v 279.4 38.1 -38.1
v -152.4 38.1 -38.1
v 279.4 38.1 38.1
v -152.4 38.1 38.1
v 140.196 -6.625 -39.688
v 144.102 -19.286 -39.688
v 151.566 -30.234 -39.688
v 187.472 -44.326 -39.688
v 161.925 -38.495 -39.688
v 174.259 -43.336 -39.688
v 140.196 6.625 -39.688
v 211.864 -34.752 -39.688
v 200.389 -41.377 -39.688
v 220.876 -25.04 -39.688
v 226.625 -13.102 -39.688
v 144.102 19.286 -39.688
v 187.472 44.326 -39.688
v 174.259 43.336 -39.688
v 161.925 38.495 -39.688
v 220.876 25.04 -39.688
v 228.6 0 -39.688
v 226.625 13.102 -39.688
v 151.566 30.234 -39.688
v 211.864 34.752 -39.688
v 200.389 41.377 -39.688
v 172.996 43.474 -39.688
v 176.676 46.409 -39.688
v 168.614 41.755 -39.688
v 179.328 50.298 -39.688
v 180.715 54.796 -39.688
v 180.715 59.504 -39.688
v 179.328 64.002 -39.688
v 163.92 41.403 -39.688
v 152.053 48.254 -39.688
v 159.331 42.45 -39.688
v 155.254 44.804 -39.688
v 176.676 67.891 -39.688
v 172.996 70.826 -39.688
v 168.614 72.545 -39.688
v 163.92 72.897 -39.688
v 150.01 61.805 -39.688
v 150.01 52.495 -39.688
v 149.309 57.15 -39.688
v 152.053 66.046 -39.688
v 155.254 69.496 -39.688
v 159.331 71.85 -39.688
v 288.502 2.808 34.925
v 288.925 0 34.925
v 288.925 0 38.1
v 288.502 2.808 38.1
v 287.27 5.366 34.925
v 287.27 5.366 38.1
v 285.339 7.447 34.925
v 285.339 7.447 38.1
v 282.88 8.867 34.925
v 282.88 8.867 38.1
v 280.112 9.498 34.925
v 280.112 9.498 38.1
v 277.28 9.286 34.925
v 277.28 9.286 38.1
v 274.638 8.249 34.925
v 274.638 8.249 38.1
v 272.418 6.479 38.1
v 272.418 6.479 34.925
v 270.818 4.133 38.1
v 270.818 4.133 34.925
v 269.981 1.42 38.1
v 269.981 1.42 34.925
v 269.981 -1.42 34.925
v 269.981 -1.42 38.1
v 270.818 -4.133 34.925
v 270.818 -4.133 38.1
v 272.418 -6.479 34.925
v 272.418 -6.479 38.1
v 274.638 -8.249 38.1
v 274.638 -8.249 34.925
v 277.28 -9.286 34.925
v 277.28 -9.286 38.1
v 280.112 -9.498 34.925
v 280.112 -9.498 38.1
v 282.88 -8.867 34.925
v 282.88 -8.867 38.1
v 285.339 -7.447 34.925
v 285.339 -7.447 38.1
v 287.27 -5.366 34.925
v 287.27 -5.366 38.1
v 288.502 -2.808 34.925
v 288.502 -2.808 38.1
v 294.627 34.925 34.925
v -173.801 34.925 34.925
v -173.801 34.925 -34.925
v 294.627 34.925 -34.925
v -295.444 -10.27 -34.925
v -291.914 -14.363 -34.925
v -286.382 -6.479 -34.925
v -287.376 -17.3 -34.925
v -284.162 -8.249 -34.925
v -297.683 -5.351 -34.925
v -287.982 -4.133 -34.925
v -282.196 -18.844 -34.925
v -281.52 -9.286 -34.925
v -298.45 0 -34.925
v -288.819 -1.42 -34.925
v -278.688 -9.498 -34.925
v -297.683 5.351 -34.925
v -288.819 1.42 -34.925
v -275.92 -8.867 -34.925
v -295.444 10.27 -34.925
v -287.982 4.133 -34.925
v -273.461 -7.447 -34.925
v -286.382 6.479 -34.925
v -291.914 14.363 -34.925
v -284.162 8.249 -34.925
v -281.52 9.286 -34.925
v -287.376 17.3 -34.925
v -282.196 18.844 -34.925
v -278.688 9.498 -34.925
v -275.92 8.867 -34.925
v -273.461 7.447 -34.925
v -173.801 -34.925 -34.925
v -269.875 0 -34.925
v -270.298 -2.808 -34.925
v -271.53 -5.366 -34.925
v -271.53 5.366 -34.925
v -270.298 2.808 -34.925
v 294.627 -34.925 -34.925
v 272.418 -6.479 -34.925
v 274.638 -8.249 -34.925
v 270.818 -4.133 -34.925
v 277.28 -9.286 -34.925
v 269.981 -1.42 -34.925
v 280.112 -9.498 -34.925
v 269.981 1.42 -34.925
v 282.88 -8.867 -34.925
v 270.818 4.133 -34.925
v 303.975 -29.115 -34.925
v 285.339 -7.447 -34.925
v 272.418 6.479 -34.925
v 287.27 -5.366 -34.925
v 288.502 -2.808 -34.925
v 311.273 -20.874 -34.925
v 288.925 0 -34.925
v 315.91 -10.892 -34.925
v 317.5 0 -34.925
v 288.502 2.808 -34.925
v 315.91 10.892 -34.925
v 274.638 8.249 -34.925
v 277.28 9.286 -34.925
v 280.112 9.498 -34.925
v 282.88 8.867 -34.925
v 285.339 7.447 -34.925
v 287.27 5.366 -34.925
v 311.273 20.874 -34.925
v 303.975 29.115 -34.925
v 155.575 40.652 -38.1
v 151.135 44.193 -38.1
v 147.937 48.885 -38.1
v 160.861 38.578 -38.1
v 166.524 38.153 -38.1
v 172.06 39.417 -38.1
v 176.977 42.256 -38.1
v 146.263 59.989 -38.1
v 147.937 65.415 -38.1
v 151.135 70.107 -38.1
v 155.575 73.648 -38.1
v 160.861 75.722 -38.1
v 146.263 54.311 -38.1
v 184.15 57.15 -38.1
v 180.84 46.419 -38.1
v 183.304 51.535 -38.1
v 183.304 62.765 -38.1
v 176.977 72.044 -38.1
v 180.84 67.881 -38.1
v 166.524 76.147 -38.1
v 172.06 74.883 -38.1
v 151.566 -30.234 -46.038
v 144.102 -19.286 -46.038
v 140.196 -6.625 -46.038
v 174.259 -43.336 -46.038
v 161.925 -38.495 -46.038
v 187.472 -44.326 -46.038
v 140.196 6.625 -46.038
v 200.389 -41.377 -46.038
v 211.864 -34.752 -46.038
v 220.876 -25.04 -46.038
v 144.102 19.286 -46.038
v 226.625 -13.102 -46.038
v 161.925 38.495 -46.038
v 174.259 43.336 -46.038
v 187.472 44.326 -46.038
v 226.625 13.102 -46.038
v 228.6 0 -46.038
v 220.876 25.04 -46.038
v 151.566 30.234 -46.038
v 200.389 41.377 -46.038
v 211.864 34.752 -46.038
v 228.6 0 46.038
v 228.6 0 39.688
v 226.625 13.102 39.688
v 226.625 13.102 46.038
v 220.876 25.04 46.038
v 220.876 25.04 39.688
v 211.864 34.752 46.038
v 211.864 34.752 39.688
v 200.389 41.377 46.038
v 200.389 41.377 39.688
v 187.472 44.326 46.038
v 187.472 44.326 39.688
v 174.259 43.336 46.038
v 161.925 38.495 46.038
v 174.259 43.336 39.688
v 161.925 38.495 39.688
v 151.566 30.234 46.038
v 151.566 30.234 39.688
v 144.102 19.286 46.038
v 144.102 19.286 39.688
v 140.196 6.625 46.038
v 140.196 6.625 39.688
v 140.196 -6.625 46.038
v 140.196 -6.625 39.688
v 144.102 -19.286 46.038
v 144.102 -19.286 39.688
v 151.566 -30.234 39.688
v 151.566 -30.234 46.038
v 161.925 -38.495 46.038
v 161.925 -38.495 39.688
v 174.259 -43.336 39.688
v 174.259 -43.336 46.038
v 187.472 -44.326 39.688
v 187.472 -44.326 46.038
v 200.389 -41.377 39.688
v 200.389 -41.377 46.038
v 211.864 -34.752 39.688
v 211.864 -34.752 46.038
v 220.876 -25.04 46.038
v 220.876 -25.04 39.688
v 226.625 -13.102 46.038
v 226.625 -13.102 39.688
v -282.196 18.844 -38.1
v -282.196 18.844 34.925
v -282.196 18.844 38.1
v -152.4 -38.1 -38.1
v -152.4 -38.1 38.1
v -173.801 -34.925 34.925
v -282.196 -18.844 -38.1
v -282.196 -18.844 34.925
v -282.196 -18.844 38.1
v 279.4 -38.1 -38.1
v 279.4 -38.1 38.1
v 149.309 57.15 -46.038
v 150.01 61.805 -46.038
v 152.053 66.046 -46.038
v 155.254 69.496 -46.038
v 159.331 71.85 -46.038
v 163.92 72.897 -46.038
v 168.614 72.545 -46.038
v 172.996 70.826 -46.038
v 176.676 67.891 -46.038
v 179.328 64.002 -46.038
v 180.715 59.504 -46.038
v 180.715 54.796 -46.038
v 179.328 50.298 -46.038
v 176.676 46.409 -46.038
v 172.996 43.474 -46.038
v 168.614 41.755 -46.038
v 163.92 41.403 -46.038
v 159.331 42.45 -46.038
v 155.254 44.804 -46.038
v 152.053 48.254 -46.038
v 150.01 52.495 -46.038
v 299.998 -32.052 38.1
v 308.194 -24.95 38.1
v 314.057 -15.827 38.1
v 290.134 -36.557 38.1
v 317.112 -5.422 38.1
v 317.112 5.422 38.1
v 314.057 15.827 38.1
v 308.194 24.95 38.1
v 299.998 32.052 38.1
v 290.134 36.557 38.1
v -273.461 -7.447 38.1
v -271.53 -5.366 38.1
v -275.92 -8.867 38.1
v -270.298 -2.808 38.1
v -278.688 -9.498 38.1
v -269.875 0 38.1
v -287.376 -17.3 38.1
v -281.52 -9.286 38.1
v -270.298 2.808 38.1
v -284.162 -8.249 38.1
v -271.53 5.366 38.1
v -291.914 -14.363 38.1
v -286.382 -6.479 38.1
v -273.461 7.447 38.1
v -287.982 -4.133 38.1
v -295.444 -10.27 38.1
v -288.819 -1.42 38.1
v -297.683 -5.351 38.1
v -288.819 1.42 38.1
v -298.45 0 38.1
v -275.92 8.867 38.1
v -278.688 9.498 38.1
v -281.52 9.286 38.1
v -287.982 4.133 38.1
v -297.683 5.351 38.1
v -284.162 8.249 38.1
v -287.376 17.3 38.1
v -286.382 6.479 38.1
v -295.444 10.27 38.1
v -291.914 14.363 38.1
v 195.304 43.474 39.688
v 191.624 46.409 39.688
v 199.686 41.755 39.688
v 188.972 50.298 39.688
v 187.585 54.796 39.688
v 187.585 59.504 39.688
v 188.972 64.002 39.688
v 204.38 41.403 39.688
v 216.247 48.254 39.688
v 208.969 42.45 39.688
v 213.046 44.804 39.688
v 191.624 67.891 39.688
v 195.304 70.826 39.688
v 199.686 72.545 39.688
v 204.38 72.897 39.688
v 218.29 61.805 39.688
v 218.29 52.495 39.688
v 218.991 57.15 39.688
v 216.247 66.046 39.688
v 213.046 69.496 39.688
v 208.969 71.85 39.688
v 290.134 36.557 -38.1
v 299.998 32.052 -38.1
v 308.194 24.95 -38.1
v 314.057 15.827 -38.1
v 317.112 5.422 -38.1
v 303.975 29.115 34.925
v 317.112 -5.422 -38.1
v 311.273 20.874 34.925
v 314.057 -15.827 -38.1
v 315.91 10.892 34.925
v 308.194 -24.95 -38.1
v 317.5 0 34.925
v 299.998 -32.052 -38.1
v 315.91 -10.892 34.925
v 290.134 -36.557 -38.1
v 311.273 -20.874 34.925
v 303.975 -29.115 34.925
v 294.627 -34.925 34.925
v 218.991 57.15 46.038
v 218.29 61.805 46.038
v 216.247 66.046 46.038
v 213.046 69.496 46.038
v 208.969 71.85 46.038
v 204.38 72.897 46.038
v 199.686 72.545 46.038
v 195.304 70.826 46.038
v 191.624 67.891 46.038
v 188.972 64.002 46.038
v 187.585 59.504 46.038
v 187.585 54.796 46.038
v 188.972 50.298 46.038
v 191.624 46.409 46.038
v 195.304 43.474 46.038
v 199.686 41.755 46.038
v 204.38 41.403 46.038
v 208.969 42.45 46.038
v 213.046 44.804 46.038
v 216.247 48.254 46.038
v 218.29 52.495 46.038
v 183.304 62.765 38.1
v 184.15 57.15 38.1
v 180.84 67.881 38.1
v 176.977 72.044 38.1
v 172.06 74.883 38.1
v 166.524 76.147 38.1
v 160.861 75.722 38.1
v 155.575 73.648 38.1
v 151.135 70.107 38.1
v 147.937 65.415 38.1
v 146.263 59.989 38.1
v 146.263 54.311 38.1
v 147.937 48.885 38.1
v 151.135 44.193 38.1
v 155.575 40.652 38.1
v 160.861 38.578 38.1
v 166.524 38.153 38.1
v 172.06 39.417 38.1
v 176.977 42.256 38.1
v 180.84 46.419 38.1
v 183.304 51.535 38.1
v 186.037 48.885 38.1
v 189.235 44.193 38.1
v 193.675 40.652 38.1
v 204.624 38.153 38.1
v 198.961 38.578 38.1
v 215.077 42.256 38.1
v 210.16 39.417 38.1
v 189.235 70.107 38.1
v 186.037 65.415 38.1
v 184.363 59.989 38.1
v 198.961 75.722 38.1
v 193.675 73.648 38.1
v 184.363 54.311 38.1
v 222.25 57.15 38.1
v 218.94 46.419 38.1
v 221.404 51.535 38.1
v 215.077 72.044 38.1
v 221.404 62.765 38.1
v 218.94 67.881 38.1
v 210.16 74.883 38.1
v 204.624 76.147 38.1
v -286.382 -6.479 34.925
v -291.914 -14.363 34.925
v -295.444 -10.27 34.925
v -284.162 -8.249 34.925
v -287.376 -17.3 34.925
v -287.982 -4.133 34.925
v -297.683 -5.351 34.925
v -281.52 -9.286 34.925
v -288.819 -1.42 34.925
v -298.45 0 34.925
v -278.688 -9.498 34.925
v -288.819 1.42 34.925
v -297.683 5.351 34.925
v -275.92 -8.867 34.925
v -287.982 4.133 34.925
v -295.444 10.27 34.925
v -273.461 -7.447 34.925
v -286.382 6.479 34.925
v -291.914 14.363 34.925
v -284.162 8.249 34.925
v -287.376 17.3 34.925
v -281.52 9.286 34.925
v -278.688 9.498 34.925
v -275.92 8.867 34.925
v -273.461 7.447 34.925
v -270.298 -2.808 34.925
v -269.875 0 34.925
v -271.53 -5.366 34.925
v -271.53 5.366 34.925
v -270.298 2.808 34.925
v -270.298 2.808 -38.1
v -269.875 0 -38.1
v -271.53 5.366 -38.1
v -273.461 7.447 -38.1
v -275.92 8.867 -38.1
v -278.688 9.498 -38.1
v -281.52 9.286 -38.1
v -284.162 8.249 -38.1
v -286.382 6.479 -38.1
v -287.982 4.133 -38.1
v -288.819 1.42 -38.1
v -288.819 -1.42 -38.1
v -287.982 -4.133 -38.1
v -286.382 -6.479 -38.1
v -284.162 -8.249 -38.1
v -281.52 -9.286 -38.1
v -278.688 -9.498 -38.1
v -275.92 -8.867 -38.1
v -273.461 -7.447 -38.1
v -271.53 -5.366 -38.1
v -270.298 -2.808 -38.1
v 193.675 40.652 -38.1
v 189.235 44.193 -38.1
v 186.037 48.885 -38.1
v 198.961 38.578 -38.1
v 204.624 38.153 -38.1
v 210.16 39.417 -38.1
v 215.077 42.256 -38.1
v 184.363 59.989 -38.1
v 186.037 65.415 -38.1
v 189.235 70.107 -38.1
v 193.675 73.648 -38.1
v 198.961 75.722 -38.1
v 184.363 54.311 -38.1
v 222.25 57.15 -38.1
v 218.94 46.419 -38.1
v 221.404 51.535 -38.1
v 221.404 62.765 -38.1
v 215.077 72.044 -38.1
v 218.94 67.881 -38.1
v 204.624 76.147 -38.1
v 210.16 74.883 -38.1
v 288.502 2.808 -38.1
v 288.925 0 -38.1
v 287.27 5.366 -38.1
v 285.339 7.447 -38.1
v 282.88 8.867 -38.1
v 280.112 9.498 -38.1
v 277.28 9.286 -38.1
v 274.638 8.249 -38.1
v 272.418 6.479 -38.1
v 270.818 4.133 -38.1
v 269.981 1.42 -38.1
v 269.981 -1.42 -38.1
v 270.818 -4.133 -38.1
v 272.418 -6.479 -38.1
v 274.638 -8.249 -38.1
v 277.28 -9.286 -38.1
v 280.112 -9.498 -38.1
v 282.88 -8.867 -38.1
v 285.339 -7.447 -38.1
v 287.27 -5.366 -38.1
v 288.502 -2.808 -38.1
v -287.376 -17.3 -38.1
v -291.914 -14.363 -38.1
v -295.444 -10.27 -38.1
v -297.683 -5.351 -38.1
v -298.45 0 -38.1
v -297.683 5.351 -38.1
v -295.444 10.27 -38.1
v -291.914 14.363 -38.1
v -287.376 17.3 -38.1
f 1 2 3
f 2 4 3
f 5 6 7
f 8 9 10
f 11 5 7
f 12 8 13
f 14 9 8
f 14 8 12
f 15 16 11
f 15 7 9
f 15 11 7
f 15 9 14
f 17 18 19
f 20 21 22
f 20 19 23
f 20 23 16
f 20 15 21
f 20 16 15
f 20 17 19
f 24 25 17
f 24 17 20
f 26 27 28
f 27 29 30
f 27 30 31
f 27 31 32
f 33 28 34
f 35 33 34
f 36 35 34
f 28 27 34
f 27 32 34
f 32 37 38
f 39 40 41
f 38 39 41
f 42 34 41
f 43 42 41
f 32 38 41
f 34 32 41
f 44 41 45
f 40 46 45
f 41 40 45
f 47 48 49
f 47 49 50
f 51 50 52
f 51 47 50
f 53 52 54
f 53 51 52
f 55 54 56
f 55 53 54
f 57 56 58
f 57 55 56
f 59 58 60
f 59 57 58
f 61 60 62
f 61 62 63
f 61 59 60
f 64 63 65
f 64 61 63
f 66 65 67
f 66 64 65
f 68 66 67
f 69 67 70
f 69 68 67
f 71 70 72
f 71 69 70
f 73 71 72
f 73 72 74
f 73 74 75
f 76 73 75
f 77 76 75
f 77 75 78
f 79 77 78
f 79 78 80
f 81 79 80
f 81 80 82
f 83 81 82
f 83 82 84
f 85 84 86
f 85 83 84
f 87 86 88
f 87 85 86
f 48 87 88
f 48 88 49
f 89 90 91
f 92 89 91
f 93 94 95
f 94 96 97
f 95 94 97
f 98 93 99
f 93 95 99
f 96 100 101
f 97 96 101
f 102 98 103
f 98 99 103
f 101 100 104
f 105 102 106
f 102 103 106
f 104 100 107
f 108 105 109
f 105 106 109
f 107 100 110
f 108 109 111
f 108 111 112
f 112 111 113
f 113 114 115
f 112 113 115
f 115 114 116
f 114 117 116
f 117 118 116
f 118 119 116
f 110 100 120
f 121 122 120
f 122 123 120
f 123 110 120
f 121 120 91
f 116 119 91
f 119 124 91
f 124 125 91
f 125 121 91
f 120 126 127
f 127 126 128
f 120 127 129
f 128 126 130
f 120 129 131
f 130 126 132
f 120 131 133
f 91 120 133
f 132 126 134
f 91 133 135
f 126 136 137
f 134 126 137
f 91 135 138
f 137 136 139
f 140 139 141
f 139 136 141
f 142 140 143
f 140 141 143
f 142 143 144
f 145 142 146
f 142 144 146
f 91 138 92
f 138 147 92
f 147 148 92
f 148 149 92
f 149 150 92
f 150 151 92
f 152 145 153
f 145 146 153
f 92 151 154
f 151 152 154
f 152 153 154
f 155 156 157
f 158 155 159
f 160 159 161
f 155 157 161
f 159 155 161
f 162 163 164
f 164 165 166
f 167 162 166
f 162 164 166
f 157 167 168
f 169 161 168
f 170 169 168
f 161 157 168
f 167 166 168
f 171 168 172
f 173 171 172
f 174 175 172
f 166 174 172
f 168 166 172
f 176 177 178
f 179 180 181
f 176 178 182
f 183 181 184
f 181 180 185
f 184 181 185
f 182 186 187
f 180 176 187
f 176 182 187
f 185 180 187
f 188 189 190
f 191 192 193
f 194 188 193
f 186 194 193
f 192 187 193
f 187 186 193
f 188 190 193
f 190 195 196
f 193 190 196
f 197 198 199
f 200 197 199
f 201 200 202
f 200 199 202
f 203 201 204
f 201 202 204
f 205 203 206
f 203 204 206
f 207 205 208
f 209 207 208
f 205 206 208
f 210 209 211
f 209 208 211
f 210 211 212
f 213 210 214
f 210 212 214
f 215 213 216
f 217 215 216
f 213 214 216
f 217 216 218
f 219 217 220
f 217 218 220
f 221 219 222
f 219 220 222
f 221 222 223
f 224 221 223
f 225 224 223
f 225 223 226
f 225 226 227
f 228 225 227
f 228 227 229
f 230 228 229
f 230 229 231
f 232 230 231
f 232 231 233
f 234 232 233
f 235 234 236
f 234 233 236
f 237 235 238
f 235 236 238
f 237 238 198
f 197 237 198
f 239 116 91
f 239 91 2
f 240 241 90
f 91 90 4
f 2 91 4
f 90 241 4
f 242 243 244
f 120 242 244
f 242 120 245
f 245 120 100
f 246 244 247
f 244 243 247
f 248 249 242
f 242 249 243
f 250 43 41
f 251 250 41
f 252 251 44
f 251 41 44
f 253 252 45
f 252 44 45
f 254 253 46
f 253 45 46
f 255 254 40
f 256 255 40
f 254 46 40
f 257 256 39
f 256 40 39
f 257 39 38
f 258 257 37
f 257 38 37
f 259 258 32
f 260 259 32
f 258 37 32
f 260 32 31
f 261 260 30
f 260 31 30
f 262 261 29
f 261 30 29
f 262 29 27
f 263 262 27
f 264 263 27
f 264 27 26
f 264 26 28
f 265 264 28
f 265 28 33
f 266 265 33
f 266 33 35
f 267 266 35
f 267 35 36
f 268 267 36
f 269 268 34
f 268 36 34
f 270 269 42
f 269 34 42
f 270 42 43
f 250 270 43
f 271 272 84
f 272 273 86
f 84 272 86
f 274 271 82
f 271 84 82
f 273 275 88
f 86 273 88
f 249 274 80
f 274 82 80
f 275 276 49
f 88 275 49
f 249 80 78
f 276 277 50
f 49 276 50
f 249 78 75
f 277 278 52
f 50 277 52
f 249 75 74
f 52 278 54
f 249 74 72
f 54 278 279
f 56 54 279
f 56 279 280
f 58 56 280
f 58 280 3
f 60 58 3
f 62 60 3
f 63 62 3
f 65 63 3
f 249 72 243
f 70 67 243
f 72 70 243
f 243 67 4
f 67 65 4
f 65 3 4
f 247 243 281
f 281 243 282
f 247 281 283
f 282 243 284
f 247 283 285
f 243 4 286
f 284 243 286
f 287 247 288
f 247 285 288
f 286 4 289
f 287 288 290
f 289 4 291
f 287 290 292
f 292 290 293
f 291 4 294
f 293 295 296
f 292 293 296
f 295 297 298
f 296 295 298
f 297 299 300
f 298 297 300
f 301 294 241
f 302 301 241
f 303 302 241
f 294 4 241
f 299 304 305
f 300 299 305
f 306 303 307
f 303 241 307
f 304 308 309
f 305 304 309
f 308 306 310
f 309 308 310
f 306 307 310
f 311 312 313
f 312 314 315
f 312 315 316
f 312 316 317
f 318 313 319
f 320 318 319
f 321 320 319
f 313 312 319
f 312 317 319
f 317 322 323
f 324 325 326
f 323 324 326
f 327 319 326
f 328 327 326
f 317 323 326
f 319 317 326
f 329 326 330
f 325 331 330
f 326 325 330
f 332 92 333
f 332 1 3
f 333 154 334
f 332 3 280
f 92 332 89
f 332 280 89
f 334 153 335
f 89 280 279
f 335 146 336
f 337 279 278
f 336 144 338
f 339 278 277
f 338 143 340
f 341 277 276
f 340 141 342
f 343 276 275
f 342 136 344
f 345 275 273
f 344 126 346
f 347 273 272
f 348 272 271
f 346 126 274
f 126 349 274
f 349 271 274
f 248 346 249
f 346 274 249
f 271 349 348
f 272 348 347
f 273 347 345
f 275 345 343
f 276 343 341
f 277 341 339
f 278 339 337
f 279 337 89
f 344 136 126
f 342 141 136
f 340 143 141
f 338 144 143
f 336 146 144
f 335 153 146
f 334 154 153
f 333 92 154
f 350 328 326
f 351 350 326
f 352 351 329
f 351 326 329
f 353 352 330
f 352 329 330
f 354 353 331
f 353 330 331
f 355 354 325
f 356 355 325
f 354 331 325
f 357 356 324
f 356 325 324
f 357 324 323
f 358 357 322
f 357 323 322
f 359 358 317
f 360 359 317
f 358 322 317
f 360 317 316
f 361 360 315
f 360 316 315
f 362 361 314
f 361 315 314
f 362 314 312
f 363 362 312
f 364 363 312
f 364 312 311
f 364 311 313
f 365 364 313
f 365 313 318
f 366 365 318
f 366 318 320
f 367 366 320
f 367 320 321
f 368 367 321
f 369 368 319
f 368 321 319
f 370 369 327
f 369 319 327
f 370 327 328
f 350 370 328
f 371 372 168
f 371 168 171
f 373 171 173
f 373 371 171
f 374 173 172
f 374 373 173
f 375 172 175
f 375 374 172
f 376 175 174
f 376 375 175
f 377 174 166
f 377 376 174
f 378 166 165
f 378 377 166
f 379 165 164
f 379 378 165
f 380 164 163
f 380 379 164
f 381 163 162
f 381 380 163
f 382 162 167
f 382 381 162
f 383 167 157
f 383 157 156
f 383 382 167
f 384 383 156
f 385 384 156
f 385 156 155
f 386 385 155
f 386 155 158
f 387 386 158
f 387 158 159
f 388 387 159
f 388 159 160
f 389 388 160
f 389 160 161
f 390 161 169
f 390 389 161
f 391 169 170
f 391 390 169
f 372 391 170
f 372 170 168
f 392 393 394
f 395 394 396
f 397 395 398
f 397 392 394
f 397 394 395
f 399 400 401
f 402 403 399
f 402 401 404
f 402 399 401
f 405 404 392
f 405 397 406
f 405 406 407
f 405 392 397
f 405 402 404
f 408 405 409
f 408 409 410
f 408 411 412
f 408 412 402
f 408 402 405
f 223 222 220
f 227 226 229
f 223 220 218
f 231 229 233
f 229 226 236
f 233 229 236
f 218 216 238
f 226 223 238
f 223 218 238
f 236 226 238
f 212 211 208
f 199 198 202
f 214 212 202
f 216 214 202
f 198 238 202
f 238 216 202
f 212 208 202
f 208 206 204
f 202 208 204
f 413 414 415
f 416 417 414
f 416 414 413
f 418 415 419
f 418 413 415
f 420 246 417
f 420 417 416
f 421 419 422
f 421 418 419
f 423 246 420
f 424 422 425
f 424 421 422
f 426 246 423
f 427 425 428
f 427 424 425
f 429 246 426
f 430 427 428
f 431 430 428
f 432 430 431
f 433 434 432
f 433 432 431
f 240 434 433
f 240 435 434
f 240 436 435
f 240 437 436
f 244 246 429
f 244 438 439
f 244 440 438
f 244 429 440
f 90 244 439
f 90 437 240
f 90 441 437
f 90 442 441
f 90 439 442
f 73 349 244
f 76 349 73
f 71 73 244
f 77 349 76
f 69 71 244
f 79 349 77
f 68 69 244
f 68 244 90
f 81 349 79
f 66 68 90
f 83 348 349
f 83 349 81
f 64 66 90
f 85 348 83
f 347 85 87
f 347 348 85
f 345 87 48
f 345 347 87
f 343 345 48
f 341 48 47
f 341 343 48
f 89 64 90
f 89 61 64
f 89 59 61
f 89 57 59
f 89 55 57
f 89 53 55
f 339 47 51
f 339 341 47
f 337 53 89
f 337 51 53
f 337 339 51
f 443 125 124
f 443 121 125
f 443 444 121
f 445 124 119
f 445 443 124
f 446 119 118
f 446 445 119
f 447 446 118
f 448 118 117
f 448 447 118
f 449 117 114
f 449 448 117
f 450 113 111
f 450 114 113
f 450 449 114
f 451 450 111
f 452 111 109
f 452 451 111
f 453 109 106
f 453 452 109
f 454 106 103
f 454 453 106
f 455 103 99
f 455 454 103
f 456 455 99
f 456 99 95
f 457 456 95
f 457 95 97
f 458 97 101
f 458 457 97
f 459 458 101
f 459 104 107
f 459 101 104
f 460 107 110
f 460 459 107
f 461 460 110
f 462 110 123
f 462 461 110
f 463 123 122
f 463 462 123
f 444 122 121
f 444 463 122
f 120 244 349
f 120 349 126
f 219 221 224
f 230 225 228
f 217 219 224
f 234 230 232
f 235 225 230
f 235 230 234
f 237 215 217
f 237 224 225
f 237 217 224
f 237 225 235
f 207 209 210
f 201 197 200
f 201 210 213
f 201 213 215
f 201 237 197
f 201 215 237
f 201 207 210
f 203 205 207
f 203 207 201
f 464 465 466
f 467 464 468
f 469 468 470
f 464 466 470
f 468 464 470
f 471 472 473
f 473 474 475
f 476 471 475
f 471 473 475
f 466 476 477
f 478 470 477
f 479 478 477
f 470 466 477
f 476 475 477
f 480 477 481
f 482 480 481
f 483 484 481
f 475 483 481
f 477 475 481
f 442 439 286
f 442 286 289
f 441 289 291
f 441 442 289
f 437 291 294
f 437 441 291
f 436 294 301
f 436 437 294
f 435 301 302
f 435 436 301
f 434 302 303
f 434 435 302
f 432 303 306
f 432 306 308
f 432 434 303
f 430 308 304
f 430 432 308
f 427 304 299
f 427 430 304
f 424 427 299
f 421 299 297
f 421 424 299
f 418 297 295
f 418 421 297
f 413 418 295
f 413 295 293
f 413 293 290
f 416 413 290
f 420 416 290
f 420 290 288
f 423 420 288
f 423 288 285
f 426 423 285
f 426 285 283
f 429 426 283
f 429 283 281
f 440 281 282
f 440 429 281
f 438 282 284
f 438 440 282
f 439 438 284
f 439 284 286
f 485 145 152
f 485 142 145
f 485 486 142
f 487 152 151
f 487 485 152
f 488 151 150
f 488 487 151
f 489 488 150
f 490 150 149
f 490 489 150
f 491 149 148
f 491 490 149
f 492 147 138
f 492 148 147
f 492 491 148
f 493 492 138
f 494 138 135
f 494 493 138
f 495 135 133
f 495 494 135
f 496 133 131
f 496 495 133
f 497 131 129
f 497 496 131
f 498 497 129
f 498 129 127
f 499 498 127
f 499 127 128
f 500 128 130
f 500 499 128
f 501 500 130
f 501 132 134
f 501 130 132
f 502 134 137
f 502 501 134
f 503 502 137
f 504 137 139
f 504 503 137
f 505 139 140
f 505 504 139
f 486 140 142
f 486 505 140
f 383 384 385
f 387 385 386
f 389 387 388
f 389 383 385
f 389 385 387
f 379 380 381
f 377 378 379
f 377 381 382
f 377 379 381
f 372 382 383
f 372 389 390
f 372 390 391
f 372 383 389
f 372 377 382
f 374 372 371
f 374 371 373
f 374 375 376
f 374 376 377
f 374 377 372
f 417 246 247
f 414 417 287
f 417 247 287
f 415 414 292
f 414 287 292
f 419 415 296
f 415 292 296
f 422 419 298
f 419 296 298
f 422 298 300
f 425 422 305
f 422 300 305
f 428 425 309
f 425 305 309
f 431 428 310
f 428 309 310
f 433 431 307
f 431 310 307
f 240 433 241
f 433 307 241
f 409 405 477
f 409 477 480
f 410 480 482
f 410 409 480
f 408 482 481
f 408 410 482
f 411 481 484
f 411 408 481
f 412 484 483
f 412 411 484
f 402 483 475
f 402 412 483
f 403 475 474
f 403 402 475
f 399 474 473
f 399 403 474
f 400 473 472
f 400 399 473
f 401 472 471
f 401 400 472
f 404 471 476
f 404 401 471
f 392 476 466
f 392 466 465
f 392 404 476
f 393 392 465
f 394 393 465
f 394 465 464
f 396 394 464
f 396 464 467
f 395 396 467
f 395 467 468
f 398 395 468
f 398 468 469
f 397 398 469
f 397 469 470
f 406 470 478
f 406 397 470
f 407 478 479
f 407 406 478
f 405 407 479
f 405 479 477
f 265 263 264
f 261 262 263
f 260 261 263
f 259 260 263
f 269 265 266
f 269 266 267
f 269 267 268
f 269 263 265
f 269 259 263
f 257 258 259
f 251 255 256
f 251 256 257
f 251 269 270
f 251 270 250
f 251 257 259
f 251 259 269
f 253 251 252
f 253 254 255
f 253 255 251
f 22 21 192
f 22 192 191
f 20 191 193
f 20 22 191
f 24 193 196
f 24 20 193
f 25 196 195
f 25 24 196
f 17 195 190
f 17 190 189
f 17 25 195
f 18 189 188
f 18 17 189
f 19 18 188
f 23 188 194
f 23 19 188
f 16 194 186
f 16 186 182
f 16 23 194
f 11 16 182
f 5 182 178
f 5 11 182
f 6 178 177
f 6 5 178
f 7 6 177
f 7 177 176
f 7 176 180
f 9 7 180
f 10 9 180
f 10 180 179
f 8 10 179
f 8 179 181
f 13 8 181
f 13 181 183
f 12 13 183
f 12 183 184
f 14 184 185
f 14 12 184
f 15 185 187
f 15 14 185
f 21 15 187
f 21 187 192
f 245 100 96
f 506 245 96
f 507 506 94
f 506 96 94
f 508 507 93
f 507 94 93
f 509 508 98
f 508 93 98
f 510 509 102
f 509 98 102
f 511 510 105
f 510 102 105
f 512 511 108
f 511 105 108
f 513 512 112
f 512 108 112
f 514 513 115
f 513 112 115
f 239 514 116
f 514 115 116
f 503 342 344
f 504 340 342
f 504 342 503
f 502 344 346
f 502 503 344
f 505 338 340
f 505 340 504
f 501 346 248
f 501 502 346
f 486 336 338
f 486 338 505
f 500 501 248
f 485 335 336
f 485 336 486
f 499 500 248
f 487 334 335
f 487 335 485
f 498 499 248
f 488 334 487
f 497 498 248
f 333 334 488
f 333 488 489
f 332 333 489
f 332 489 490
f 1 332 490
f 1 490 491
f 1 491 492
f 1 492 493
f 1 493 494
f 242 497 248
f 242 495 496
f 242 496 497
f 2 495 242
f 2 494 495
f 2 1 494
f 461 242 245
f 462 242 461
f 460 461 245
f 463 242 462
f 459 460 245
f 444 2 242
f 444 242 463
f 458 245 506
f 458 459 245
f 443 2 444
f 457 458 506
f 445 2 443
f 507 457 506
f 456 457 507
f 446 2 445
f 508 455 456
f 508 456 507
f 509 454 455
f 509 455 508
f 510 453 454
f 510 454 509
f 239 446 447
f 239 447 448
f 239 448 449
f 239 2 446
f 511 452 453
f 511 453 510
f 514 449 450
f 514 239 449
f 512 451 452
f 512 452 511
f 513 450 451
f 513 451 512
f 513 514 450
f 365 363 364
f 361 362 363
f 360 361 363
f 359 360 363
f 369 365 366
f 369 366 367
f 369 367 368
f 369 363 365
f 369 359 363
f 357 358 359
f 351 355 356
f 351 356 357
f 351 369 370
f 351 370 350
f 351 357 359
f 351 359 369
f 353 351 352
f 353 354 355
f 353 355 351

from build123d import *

# Parameters (mm, degrees)
SKETCH1_R               = 9.525
BOSS_EXTRUDE1_DEPTH     = 38.1
SKETCH2_W               = 69.85
SKETCH2_H               = 69.85
CUT_EXTRUDE1_DEPTH      = 318.5
CUT_EXTRUDE1_DEPTH_BACK = 299.45
SKETCH3_R               = 19.05
BOSS_EXTRUDE2_DEPTH     = 76.2
BOSS_EXTRUDE2_2_DEPTH   = 76.2
BOSS_EXTRUDE3_START     = 1.5875
SKETCH4_R               = 44.45
BOSS_EXTRUDE3_DEPTH     = 6.35
SKETCH4_R_2             = 15.791389426
BOSS_EXTRUDE3_2_DEPTH   = 6.35
BOSS_EXTRUDE4_START     = 1.5875
SKETCH5_R               = 15.791389426
BOSS_EXTRUDE4_DEPTH     = 6.35


with BuildPart() as part:
    # Sketch1 → Boss-Extrude1 (new body, symmetric)
    with BuildSketch(Plane.XY):
        with BuildLine():
            Line((-282.195625509, 18.843751697), (-152.4, 38.1))
            Line((-152.4, 38.1), (279.4, 38.1))
            ThreePointArc((279.4, 38.1), (317.5, 0), (279.4, -38.1))
            Line((279.4, -38.1), (-152.4, -38.1))
            Line((-152.4, -38.1), (-282.195625509, -18.843751697))
            ThreePointArc((-282.195625509, -18.843751697), (-298.45, 0), (-282.195625509, 18.843751697))
        make_face()
        with Locations((279.4, 0)):
            Circle(SKETCH1_R, mode=Mode.SUBTRACT)
        with Locations((-279.4, 0)):
            Circle(SKETCH1_R, mode=Mode.SUBTRACT)
    extrude(amount=BOSS_EXTRUDE1_DEPTH, both=True)

    # Sketch2 → Cut-Extrude1 (cut, two sides)
    with BuildSketch(Plane(origin=(0, 0, 0), x_dir=(0, 0, -1), z_dir=(1, 0, 0))) as cut_extrude1_sk:
        Rectangle(SKETCH2_W, SKETCH2_H)
    extrude(amount=CUT_EXTRUDE1_DEPTH, mode=Mode.SUBTRACT)
    extrude(cut_extrude1_sk.sketch, amount=-CUT_EXTRUDE1_DEPTH_BACK, mode=Mode.SUBTRACT)


with BuildPart() as body_2:
    # Sketch3 → Boss-Extrude2 (new body)
    with BuildSketch(Plane.XY.offset(38.1)):
        with Locations((165.1, 57.15)):
            Circle(SKETCH3_R)
    extrude(amount=-BOSS_EXTRUDE2_DEPTH)


with BuildPart() as body_3:
    # Sketch3 → Boss-Extrude2 2 (new body)
    with BuildSketch(Plane.XY.offset(38.1)):
        with Locations((203.2, 57.15)):
            Circle(SKETCH3_R)
    extrude(amount=-BOSS_EXTRUDE2_2_DEPTH)


with BuildPart() as body_4:
    # Sketch4 → Boss-Extrude3 (new body)
    with BuildSketch(Plane.XY.offset(38.1).offset(BOSS_EXTRUDE3_START)):
        with Locations((184.15, 0)):
            Circle(SKETCH4_R)
    extrude(amount=BOSS_EXTRUDE3_DEPTH)


with BuildPart() as body_5:
    # Sketch4 → Boss-Extrude3 2 (new body)
    with BuildSketch(Plane.XY.offset(38.1).offset(BOSS_EXTRUDE3_START)):
        with Locations((203.2, 57.15)):
            Circle(SKETCH4_R_2)
    extrude(amount=BOSS_EXTRUDE3_2_DEPTH)


with BuildPart() as body_6:
    # Mirror1: mirrored copy
    add(body_4.part.mirror(Plane.XY))


with BuildPart() as body_7:
    # Sketch5 → Boss-Extrude4 (new body)
    with BuildSketch(Plane(origin=(0, 0, -38.1), x_dir=(-1, 0, 0), z_dir=(0, 0, -1)).offset(BOSS_EXTRUDE4_START)):
        with Locations((-165.1, 57.15)):
            Circle(SKETCH5_R)
    extrude(amount=BOSS_EXTRUDE4_DEPTH)


solid = Compound([part.part, body_2.part, body_3.part, body_4.part, body_5.part, body_6.part, body_7.part])
